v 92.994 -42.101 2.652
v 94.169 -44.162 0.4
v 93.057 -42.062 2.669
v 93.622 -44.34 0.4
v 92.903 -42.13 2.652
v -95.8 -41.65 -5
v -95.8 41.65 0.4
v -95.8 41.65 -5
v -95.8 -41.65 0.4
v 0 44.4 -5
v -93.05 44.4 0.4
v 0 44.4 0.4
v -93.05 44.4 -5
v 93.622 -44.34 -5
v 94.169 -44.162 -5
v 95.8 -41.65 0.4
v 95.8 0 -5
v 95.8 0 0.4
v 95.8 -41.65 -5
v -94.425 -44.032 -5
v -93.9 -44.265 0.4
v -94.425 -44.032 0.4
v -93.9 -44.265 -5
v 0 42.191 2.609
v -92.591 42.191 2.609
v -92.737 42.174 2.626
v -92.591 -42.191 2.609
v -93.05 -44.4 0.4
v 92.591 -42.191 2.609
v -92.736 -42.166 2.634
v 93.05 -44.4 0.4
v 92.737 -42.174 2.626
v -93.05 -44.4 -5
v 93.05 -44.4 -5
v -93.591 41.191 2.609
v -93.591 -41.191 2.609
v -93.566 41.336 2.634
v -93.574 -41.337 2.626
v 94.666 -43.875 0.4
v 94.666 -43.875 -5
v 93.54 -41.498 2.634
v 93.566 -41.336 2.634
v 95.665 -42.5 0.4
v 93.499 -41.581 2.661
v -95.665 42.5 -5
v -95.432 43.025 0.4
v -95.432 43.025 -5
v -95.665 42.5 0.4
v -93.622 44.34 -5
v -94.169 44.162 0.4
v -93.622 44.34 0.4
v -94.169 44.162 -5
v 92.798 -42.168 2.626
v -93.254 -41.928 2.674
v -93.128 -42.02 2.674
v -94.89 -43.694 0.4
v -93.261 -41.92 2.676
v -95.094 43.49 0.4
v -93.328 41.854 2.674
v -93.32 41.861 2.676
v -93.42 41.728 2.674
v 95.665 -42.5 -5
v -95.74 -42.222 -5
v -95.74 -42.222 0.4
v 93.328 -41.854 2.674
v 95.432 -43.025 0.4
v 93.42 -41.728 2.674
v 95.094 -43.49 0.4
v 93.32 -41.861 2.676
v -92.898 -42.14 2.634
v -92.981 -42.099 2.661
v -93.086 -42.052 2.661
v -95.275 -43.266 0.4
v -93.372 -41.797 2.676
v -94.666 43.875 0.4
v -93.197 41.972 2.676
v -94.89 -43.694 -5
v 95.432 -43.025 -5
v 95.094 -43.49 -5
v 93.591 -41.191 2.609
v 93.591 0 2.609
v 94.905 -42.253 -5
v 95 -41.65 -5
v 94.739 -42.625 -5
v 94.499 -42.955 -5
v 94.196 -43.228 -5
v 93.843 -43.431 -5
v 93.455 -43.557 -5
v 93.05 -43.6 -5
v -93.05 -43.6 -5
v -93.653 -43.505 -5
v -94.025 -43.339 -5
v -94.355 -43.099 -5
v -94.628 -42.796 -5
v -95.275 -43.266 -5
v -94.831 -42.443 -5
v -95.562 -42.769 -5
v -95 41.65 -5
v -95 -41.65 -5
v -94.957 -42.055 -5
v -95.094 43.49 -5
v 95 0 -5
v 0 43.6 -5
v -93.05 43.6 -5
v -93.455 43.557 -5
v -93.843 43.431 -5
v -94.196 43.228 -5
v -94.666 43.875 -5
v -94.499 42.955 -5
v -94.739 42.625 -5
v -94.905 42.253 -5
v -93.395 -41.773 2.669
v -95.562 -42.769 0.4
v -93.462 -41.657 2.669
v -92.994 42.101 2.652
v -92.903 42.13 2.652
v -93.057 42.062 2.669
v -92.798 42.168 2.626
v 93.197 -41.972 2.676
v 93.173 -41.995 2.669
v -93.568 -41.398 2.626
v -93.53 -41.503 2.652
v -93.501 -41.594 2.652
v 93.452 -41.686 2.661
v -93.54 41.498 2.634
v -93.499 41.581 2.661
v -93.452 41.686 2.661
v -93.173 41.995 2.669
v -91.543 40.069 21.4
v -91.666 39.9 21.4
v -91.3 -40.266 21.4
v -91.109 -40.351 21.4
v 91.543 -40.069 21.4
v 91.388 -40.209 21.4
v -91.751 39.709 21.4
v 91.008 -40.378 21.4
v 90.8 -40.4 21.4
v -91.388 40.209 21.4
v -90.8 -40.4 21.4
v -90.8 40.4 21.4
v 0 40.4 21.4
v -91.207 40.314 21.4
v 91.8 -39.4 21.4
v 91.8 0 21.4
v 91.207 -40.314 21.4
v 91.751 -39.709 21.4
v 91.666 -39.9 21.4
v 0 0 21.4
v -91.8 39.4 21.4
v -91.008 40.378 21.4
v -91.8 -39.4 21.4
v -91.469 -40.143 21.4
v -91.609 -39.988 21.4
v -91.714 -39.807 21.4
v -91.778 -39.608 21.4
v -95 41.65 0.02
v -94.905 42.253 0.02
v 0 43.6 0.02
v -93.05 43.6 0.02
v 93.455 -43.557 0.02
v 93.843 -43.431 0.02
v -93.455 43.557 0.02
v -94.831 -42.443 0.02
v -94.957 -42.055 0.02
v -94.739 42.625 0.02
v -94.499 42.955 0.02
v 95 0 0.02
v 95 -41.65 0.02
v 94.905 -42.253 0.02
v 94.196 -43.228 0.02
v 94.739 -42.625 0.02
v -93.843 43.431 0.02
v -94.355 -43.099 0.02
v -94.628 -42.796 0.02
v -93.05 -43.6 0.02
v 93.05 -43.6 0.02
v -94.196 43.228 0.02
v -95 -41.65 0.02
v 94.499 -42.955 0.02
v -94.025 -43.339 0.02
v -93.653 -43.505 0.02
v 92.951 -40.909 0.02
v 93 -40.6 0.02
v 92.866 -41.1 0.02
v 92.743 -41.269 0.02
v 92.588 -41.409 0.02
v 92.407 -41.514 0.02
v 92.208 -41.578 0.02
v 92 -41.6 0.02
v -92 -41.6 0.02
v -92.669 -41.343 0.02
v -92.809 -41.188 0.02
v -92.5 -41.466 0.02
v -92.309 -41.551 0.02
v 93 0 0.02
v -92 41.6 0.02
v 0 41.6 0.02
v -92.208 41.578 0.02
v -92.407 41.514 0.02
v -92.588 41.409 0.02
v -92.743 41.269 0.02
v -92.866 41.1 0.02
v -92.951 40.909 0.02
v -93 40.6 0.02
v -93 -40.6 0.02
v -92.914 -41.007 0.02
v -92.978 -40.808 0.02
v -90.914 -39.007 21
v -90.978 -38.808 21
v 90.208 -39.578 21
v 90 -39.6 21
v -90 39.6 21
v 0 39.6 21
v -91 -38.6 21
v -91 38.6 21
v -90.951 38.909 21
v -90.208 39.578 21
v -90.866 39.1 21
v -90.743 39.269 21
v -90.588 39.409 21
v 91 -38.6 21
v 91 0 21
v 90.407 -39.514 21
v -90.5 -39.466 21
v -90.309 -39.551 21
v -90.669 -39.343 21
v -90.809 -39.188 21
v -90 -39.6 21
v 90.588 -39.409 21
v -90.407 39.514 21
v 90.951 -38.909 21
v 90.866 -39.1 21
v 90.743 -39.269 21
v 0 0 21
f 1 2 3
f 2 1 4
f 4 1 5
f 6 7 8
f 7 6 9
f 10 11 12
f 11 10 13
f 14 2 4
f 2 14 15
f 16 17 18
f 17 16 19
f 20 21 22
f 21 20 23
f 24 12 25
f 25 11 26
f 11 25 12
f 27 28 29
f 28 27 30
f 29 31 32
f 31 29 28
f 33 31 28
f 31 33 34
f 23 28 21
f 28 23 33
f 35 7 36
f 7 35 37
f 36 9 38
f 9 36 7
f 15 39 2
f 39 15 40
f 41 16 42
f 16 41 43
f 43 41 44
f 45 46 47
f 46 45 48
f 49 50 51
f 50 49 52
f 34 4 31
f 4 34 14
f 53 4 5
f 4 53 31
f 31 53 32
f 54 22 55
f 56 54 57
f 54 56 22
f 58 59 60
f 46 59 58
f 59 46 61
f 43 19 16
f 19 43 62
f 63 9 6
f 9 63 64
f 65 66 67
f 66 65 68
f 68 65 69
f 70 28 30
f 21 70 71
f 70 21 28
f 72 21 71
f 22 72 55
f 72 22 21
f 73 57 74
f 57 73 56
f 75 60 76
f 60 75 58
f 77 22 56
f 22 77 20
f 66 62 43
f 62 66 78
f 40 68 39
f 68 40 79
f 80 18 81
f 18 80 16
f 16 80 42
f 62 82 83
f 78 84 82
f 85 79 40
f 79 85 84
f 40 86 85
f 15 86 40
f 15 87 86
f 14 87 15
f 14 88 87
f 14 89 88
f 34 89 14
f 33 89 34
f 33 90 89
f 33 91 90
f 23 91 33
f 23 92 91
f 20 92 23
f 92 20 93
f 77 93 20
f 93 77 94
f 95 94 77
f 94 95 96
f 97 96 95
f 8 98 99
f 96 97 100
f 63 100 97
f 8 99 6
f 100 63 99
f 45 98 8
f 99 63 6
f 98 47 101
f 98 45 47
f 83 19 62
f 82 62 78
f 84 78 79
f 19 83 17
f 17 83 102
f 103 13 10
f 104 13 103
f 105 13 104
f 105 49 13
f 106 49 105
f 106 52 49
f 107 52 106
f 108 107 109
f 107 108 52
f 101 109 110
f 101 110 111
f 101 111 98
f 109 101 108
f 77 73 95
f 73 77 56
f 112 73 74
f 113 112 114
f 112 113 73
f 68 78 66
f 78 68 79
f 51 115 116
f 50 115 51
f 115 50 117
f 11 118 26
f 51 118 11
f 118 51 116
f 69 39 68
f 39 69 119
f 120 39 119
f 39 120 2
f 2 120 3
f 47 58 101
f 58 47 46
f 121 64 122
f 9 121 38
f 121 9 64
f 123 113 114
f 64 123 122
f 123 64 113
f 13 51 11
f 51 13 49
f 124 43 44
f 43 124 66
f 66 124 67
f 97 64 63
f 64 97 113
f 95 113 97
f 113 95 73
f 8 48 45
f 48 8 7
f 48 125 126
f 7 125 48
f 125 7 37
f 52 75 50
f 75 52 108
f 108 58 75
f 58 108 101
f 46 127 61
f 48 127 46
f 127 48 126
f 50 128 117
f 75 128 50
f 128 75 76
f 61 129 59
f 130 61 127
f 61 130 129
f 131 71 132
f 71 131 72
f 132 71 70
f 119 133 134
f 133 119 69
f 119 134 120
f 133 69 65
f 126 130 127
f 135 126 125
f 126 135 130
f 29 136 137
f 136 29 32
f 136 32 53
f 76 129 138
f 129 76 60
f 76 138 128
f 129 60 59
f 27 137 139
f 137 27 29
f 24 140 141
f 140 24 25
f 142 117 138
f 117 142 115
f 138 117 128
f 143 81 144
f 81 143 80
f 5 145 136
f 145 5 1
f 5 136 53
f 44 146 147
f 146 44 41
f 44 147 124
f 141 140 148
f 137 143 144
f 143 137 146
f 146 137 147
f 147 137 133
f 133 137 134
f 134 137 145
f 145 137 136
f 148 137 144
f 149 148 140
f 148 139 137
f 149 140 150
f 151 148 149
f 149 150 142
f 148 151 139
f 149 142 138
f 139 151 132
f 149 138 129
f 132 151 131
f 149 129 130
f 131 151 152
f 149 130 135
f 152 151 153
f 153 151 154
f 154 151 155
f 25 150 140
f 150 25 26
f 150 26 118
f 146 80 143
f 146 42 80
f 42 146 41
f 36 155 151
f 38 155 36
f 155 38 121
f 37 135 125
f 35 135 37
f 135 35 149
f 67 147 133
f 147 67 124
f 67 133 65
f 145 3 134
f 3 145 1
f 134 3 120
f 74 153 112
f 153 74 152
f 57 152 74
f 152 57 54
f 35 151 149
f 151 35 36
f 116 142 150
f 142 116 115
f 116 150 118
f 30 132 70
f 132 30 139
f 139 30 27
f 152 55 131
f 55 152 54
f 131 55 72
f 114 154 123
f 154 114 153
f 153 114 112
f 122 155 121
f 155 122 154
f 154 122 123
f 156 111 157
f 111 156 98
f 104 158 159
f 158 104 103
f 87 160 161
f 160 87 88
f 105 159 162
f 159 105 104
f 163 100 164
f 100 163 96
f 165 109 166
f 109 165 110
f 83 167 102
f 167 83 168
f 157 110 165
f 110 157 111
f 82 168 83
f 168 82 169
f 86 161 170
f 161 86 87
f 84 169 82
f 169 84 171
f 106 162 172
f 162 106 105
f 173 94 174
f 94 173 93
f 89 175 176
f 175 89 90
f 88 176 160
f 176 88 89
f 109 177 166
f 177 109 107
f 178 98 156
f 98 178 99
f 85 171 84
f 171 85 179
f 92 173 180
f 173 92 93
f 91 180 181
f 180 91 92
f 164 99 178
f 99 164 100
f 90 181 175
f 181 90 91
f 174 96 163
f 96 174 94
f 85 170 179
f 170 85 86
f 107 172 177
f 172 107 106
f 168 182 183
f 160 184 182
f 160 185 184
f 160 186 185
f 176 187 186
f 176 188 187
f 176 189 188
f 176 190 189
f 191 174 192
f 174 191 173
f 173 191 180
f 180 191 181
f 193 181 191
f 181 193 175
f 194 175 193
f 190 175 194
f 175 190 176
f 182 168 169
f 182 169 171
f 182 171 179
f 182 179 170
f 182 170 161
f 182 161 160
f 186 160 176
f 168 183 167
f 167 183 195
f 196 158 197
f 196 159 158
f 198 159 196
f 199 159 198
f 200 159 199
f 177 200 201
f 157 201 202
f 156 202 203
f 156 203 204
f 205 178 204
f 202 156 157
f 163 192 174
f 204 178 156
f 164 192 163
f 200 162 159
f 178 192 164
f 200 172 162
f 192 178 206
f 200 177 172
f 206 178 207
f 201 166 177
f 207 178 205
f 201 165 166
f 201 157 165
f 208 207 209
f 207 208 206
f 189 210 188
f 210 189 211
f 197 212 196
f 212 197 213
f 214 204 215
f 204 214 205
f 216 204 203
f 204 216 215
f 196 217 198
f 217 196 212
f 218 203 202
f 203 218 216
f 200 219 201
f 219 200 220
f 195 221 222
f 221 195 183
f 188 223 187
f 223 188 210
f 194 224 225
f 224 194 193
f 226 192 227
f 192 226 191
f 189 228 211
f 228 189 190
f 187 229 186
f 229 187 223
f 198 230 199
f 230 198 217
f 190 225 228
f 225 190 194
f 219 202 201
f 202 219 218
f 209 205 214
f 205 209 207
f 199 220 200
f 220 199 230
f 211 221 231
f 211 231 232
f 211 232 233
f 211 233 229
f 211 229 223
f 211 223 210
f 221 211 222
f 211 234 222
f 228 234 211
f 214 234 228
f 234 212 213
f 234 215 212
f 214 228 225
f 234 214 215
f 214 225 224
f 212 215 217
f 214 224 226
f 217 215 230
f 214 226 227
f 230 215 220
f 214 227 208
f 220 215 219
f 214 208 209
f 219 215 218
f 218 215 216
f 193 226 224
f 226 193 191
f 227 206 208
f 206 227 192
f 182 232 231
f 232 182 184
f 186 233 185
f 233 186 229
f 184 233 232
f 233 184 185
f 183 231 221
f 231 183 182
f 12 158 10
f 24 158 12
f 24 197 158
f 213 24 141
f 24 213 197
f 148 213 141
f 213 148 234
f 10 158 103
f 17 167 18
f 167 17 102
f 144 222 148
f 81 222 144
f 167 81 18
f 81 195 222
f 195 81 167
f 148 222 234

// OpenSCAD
// Measured parameters
kx3_width = 190;
kx3_height = 87.2;
kx3_corner_rounding_radius = 1.95;

// Constrained but not maximized parameters
horizontal_inward_clearance_bottom = 2;  // max 3 for VFO knob base
horizontal_inward_clearance_top = 4;
vertical_side_jack_clearance = 5;  // max 9 or so depending on accessory plug diameter
panel_control_clearance_height = 21;

// Chosen parameters
vertical_wall_thickness = 0.8;
horizontal_wall_thickness = 0.4;
epsilon = 0.02;


difference() {
    main();
    translate([0, 0, -500])
    cube([1000, 1000, 1000]);
}


module main() {
    difference() {
        exterior_volume();
        interior_volume();
    }
}

module interior_volume() {
    // Rim
    mirror([0, 0, 1])
    translate([0, 0, -epsilon])
    linear_extrude(vertical_side_jack_clearance + epsilon * 2)
    offset(r=kx3_corner_rounding_radius, $fn=30)
    offset(delta=-kx3_corner_rounding_radius)
    square([kx3_width, kx3_height], center=true);
    
    // Volume for panel controls
    panel_clearance_volume();
}

module exterior_volume() {
    // Rim
    mirror([0, 0, 1])
    translate([0, 0, -horizontal_wall_thickness])
    hull() {
        rim_outer_radius = kx3_corner_rounding_radius + vertical_wall_thickness;
        linear_extrude(vertical_side_jack_clearance + horizontal_wall_thickness)
        corner_round(rim_outer_radius)
        rim_2d();
        
        // create 45° overhang support
        // Precise form of this would be matching the slope of the horizontal clearance but that would be a line intersection problem, so fudge it.
        overhang_inset = horizontal_inward_clearance_bottom * 1.6;
        translate([0, 0, -overhang_inset])
        linear_extrude(epsilon)
        offset(delta=-overhang_inset)
        rim_2d();
    }
    
    // Volume for panel controls
    minkowski() {
        cube([vertical_wall_thickness, vertical_wall_thickness, horizontal_wall_thickness] * 2, center=true);
        panel_clearance_volume();
    }
    
    module panel_2d() {
        square([
            kx3_width - horizontal_inward_clearance_bottom * 2 + vertical_wall_thickness * 2, 
            kx3_height - horizontal_inward_clearance_bottom * 2 + vertical_wall_thickness * 2
        ], center=true);
    }
    
    module rim_2d() {
        square([kx3_width + vertical_wall_thickness * 2, kx3_height + vertical_wall_thickness * 2], center=true);
    }
}

module panel_clearance_volume() {
    hull() {
        // bottom
        linear_extrude(epsilon)
        corner_round(1)
        square([
            kx3_width - horizontal_inward_clearance_bottom * 2,
            kx3_height - horizontal_inward_clearance_bottom * 2,
        ], center=true);

        // top (bottom as printed)
        translate([0, 0, panel_control_clearance_height])
        mirror([0, 0, 1])
        linear_extrude(epsilon)
        corner_round(1)
        square([
            kx3_width - horizontal_inward_clearance_top * 2,
            kx3_height - horizontal_inward_clearance_top * 2,
        ], center=true);
    }
}

module corner_round(r) {
    offset(r=r, $fn=30)
    offset(delta=-r)
    children();
}
